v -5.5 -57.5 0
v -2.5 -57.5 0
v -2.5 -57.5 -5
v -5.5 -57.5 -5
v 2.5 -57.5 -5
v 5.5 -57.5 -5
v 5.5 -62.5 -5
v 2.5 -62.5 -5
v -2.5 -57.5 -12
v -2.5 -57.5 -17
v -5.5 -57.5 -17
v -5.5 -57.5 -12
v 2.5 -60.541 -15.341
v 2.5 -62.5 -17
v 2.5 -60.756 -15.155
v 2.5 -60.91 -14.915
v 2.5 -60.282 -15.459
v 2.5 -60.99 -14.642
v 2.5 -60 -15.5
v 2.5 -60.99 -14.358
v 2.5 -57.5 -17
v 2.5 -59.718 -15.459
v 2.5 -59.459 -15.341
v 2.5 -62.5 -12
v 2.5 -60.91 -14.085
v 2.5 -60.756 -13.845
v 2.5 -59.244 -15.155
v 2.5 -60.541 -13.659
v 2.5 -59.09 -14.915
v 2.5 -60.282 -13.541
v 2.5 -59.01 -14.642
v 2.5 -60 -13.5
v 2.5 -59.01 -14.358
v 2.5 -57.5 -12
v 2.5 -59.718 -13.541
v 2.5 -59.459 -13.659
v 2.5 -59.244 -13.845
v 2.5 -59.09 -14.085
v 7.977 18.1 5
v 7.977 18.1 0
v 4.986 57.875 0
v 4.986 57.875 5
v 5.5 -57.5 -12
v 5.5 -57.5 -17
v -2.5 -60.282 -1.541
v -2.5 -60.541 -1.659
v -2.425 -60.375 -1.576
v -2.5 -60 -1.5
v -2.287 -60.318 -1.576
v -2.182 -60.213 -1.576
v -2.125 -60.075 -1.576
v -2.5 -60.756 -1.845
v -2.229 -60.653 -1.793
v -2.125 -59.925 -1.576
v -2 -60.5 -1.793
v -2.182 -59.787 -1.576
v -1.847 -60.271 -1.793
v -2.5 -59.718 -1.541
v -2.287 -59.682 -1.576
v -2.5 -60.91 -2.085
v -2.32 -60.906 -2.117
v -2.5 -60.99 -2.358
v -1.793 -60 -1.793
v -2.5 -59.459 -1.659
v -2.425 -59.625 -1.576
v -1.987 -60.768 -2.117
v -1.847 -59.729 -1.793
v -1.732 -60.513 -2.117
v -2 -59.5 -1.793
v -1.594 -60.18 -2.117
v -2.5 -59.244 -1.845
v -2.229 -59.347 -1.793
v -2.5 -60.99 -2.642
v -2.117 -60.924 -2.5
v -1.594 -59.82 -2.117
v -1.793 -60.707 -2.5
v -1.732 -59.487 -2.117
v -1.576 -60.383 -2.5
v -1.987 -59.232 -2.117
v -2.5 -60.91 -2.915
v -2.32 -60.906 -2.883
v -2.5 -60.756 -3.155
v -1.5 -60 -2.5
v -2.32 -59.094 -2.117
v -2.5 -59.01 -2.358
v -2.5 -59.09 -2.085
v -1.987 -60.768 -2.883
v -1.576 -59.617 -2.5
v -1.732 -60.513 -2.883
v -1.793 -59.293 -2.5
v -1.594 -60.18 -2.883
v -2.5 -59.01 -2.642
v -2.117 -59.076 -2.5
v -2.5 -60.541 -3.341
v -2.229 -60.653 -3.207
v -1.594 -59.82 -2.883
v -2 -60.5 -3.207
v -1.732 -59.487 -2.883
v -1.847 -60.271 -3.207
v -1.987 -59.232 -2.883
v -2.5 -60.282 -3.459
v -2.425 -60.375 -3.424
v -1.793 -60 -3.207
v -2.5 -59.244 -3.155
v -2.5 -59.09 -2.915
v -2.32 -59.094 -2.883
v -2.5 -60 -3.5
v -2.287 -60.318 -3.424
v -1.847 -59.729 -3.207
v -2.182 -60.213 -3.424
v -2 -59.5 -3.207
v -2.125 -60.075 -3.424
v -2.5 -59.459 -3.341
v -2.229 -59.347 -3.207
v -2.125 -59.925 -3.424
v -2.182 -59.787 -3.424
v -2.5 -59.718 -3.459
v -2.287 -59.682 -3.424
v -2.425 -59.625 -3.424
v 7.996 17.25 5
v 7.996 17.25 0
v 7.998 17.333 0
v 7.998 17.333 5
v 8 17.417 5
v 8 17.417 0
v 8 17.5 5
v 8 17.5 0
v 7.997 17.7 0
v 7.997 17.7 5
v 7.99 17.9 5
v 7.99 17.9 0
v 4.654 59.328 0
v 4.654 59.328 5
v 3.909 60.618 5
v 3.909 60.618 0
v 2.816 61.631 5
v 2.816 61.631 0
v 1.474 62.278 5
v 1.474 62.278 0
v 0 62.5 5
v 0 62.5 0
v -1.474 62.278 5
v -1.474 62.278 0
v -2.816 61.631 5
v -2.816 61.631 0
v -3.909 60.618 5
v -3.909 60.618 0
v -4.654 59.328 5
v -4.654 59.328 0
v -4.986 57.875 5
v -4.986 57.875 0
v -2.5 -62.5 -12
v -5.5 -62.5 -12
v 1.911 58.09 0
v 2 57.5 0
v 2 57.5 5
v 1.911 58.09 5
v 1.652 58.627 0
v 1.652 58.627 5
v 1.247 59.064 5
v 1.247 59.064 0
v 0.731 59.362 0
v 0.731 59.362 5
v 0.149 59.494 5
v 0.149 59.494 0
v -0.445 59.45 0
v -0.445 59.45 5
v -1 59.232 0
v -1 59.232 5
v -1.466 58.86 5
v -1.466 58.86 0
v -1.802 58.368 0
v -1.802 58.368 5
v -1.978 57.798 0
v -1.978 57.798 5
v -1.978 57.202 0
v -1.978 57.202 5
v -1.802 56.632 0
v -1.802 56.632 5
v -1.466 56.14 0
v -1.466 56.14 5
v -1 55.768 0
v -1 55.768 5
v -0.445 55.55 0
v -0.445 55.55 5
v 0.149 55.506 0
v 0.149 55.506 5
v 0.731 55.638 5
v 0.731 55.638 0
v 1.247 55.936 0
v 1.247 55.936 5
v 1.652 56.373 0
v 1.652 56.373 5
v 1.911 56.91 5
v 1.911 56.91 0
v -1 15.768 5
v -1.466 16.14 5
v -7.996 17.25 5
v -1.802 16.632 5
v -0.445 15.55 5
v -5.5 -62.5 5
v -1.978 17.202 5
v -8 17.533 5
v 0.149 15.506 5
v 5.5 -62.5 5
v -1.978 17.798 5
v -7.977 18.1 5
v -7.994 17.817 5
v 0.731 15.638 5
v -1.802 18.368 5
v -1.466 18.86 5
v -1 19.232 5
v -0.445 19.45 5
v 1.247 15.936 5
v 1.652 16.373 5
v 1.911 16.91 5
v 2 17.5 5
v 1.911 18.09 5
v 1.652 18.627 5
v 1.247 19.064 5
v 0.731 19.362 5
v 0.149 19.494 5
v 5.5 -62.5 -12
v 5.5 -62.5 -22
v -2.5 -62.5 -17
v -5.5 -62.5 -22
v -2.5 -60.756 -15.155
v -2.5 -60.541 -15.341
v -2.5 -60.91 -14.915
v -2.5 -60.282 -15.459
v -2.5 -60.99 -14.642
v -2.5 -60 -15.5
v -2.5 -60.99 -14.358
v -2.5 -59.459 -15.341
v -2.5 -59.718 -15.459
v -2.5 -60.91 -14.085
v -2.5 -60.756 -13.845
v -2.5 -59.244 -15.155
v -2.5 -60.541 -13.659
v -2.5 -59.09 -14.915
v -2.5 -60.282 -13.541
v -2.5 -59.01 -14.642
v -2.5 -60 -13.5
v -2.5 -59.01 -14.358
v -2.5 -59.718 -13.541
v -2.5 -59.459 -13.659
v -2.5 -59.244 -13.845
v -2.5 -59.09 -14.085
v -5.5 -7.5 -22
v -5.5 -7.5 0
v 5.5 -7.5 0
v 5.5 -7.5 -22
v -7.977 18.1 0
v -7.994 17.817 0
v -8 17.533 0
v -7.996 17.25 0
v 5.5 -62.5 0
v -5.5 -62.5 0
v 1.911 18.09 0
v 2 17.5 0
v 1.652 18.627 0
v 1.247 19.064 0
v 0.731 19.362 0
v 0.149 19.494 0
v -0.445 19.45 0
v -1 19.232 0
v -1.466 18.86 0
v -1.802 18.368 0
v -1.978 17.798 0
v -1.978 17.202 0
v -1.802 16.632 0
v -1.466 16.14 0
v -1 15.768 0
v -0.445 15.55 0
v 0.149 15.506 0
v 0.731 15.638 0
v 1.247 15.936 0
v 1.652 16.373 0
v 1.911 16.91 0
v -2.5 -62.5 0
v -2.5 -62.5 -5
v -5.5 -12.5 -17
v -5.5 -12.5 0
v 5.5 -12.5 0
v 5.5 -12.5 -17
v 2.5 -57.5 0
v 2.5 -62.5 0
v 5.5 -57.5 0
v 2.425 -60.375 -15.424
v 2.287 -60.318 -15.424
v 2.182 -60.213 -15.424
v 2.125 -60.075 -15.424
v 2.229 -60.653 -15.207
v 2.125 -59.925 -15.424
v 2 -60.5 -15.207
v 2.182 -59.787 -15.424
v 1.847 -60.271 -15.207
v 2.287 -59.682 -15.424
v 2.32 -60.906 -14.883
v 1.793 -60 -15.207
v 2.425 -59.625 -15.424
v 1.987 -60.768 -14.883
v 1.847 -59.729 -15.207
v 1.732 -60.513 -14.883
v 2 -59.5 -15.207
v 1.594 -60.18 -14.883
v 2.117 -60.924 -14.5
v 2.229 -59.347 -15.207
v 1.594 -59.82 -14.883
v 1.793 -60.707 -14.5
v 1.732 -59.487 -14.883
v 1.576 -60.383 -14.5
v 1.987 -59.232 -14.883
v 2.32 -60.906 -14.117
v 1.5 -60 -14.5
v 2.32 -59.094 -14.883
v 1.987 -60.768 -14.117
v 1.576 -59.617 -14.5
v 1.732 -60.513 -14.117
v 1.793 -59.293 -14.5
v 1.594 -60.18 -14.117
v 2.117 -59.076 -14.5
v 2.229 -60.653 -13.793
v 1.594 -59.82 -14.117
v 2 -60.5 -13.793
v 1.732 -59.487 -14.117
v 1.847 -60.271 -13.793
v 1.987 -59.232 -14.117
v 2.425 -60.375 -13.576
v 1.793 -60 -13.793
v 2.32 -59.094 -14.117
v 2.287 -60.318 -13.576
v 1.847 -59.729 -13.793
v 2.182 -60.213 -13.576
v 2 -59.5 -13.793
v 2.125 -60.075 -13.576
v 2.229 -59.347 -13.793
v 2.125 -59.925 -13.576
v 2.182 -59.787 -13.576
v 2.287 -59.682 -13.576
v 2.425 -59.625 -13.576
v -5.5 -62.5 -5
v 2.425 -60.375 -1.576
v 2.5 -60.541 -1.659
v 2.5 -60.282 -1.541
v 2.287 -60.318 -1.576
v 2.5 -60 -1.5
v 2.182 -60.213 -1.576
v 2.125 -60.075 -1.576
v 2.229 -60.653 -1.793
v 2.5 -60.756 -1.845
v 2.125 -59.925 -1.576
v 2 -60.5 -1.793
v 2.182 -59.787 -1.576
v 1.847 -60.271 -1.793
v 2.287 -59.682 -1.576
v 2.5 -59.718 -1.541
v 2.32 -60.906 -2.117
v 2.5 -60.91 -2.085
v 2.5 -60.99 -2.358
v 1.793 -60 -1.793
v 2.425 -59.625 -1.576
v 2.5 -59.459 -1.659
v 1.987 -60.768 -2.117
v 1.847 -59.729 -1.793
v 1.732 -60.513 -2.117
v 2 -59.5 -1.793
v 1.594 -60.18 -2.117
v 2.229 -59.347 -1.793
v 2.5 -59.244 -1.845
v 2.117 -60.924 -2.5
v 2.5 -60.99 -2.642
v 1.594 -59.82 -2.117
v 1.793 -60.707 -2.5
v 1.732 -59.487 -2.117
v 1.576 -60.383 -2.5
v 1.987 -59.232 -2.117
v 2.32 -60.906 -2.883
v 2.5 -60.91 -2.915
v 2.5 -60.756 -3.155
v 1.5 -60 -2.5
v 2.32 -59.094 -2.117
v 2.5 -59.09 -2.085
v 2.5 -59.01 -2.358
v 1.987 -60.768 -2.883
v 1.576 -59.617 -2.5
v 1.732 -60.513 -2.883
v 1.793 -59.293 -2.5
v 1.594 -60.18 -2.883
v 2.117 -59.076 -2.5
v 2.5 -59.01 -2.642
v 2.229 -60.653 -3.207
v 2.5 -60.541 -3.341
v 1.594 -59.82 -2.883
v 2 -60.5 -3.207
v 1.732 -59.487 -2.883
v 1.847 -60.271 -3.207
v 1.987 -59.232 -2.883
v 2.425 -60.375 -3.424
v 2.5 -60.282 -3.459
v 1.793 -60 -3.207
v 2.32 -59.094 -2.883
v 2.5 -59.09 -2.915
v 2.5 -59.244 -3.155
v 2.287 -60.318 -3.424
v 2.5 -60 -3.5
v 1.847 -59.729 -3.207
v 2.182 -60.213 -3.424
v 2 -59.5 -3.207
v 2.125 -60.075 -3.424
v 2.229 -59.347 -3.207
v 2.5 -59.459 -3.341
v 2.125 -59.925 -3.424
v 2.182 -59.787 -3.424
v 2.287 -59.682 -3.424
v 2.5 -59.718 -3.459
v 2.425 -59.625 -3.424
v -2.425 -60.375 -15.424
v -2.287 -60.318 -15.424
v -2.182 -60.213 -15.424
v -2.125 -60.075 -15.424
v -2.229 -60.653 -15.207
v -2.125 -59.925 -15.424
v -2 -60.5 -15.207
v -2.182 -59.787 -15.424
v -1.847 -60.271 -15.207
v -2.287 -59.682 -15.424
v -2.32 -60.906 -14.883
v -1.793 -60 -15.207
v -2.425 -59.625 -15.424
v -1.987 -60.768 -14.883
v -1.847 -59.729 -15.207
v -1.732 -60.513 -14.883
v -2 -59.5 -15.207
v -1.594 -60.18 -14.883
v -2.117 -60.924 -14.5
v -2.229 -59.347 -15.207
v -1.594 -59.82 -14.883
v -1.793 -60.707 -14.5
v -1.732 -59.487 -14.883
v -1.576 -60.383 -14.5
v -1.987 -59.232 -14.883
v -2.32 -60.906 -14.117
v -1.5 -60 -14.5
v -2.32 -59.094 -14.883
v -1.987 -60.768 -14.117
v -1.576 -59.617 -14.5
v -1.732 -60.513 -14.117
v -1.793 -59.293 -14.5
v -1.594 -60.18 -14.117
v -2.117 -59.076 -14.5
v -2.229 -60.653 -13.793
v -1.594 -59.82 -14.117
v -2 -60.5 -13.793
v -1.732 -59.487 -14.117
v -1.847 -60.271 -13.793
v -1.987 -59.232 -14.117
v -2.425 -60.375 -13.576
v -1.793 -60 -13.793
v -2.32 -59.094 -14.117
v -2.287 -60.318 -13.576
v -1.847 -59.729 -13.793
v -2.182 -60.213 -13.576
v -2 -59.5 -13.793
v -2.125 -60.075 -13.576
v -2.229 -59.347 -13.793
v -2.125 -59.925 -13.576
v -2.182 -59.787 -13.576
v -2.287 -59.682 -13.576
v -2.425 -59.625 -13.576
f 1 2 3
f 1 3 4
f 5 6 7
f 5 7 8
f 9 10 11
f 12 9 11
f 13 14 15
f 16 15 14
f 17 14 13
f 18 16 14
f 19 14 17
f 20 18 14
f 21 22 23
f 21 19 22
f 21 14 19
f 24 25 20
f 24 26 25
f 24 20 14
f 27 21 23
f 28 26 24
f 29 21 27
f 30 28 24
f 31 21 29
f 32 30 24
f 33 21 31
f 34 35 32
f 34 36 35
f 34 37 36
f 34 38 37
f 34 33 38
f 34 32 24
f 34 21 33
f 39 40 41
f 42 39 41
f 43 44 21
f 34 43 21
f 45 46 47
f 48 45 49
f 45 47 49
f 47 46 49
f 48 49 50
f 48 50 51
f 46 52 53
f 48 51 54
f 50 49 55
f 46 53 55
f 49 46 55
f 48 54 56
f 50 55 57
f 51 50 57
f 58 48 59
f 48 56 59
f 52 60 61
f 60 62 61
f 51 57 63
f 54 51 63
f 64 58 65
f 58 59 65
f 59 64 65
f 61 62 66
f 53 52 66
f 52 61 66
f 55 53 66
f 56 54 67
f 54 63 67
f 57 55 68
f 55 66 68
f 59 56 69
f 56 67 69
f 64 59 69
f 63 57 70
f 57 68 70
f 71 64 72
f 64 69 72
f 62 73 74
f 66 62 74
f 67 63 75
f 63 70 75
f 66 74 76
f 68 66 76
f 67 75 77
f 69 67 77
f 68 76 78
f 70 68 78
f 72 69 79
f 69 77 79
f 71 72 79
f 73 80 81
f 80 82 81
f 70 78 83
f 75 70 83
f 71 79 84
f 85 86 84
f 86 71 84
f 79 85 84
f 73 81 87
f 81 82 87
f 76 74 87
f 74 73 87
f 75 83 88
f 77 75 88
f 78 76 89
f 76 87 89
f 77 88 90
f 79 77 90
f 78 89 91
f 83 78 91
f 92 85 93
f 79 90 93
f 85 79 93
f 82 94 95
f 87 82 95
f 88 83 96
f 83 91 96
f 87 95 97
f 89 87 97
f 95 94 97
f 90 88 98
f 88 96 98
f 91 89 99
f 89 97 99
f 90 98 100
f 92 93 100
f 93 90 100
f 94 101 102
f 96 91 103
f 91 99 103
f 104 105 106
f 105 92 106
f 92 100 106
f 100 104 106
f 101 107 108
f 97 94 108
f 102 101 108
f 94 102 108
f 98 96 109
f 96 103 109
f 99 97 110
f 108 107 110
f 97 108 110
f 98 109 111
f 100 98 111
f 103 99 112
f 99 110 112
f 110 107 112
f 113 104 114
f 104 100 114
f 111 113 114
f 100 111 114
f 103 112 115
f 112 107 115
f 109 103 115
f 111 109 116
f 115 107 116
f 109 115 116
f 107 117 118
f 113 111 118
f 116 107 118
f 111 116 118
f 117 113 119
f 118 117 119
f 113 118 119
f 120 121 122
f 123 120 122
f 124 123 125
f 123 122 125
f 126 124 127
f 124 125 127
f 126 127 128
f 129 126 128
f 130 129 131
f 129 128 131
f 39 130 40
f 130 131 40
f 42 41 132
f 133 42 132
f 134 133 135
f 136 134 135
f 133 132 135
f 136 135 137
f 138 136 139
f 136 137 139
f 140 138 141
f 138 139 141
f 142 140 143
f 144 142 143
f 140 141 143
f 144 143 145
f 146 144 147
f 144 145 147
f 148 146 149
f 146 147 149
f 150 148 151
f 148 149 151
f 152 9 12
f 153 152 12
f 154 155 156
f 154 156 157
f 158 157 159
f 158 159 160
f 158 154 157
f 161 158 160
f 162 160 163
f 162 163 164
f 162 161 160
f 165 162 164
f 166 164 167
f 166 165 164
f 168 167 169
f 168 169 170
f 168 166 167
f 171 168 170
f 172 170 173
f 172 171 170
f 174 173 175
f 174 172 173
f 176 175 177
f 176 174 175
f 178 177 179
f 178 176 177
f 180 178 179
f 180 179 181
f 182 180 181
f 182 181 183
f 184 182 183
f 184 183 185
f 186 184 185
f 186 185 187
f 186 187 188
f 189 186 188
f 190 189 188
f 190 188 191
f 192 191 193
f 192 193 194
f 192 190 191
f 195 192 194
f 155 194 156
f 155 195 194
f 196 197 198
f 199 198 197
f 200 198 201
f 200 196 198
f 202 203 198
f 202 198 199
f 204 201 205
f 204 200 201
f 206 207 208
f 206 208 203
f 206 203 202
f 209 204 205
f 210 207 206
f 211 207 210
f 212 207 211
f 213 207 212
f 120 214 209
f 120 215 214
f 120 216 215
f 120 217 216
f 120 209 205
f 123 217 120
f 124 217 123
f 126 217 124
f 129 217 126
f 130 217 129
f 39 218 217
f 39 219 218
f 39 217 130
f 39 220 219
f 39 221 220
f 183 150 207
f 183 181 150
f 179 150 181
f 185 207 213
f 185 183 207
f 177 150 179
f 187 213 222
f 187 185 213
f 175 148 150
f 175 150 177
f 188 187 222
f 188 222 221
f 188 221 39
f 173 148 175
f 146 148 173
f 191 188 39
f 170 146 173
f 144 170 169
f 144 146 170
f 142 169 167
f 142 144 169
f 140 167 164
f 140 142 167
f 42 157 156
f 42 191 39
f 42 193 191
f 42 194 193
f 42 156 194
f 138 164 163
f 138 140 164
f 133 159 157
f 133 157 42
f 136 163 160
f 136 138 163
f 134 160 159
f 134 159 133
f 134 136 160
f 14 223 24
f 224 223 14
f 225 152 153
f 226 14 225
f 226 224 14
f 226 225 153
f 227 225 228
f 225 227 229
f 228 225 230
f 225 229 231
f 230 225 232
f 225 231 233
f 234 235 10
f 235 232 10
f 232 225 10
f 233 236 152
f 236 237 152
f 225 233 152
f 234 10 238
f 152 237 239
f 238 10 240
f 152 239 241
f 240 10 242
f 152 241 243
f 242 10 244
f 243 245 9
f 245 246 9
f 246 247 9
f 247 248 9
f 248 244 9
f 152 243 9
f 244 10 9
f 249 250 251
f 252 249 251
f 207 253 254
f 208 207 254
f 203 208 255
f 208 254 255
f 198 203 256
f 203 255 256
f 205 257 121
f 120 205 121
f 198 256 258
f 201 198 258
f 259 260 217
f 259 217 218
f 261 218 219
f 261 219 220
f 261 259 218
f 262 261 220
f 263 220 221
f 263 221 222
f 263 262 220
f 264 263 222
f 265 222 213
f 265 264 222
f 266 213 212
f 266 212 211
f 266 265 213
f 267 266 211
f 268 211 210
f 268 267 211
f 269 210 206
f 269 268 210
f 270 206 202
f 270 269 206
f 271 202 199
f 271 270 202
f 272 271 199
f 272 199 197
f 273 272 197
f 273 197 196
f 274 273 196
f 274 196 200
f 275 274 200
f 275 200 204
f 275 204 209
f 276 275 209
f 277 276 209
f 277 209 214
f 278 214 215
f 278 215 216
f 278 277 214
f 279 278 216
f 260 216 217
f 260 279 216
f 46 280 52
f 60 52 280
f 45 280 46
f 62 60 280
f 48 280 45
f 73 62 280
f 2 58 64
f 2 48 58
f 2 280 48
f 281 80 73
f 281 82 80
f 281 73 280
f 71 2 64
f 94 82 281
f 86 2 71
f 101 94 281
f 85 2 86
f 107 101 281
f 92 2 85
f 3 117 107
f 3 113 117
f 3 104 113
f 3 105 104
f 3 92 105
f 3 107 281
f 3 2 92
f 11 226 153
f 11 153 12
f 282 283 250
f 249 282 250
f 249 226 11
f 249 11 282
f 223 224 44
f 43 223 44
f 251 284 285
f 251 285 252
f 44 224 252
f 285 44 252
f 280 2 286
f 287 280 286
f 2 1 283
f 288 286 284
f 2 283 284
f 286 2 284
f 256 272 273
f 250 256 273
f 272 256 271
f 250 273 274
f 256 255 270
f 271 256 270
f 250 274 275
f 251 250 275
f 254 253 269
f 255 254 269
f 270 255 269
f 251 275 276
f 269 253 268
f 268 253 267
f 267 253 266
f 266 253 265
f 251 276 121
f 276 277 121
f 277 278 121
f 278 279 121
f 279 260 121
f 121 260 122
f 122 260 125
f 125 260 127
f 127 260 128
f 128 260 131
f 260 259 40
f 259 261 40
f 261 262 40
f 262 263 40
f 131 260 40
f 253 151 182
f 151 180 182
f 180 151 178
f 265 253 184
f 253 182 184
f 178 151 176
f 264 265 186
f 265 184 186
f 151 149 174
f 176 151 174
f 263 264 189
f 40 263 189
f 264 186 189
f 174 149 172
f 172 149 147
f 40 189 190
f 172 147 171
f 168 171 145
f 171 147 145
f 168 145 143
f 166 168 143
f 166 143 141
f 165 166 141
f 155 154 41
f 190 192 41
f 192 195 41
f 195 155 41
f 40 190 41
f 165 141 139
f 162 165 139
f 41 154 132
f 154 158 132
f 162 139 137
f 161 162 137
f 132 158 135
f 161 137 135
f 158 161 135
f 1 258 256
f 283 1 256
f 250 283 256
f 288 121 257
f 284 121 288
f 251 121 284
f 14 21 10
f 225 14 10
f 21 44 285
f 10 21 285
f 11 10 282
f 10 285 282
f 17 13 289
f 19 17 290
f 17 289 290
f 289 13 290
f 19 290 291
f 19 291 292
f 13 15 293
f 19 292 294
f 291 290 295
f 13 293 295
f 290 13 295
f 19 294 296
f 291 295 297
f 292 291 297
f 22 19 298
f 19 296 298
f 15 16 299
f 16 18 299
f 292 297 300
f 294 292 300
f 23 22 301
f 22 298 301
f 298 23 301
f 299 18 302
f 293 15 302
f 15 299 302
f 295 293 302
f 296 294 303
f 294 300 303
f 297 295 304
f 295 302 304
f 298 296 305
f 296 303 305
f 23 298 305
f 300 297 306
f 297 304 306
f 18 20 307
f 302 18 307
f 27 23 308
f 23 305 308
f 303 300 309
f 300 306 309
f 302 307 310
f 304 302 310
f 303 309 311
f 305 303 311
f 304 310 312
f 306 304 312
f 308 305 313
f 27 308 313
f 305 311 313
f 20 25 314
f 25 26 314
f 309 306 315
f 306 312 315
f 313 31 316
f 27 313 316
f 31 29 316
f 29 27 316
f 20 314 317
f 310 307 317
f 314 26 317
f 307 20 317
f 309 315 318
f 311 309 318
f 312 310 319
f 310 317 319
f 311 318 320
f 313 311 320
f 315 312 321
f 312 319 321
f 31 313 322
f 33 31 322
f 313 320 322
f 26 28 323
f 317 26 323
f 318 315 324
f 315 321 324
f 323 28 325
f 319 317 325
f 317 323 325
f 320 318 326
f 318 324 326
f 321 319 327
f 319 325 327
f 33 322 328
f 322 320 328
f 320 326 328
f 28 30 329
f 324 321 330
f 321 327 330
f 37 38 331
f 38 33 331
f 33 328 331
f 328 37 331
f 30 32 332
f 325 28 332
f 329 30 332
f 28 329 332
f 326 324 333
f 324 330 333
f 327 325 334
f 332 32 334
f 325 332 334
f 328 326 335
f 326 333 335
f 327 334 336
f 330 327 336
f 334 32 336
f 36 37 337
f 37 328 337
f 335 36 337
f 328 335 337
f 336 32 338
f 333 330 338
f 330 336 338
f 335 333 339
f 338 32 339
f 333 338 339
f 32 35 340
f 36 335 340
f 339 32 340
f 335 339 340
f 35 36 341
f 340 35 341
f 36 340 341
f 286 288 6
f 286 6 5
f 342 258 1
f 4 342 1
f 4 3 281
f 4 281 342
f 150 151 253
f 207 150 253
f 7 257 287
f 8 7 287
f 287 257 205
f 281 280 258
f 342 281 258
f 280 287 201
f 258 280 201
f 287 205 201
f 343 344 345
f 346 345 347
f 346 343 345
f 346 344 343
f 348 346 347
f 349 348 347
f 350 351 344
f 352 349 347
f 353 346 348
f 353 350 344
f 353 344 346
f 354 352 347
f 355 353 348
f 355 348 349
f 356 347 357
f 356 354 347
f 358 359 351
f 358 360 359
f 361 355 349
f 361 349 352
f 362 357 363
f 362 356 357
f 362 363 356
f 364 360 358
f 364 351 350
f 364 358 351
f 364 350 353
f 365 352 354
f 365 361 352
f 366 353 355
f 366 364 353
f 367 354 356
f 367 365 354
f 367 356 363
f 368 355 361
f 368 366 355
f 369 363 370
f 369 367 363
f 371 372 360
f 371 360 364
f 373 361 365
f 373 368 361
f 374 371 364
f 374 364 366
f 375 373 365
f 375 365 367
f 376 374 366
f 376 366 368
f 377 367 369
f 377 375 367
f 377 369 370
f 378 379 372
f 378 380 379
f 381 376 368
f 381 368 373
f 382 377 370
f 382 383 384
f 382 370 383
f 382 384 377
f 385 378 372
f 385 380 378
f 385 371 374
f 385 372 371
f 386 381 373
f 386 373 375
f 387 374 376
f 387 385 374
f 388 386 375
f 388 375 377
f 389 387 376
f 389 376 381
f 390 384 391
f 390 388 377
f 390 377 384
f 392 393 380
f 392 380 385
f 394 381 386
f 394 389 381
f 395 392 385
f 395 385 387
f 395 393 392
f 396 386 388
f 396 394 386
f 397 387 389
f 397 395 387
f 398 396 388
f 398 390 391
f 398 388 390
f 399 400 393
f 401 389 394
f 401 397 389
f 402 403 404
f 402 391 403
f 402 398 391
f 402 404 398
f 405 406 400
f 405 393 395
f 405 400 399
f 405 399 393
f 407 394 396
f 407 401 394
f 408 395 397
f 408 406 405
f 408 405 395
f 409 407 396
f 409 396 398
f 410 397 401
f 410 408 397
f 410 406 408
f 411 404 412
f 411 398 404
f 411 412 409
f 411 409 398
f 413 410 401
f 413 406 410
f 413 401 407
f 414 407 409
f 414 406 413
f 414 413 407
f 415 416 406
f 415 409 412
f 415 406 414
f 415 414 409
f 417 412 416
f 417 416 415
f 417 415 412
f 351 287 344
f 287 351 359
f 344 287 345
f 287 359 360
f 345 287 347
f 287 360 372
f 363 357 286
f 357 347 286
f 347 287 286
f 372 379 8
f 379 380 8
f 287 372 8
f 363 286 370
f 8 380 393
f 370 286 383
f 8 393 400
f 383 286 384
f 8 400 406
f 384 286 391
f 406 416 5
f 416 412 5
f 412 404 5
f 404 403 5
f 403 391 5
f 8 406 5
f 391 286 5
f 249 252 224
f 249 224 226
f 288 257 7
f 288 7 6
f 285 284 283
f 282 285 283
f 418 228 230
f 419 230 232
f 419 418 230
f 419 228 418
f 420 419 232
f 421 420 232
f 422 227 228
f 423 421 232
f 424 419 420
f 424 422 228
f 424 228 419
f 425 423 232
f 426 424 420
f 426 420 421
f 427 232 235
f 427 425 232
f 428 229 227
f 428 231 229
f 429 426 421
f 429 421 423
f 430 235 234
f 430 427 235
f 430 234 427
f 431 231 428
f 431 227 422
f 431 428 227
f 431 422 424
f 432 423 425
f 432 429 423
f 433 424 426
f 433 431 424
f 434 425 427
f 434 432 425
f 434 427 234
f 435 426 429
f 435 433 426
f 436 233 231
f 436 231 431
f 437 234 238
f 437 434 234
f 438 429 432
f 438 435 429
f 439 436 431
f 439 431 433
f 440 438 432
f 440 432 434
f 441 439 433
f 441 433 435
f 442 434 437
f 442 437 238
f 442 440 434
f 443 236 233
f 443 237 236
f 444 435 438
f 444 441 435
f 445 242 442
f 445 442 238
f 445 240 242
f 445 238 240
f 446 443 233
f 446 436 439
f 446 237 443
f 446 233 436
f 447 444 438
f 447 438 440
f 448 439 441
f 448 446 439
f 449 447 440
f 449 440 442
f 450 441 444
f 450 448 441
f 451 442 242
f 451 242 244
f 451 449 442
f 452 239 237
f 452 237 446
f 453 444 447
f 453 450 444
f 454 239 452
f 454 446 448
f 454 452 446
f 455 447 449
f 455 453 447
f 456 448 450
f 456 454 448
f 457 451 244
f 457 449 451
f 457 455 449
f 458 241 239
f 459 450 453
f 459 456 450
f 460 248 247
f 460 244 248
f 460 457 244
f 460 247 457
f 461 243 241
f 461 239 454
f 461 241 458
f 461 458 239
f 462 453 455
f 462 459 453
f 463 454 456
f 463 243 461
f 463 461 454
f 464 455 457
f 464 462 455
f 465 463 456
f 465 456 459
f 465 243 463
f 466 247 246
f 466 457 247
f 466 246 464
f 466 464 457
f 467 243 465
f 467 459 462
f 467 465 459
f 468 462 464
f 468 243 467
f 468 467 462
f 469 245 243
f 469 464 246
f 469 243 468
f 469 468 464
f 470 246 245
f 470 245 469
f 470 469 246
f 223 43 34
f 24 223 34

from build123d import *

# Parameters (mm, degrees)
SKETCH1_R           = 2
SKETCH1_R_2         = 5
BOSS_EXTRUDE1_DEPTH = 5
SKETCH2_W           = 11
SKETCH2_H           = 5
BOSS_EXTRUDE2_DEPTH = 5
SKETCH2_3_W         = 5.5
SKETCH2_3_H         = 5
BOSS_EXTRUDE3_DEPTH = 22
SKETCH4_W           = 5
SKETCH4_H           = 5
CUT_EXTRUDE1_DEPTH  = 20
SKETCH6_W           = 11
SKETCH6_H           = 5
BOSS_EXTRUDE4_DEPTH = 50


with BuildPart() as part:
    # Sketch1 → Boss-Extrude1 (new body)
    with BuildSketch(Plane.XY):
        with BuildLine():
            ThreePointArc((7.996084375, 17.249730801), (0, 9.5), (-7.996084375, 17.249730801))
            Line((-7.996084375, 17.249730801), (-5.5, -62.5))
            Line((-5.5, -62.5), (5.5, -62.5))
            Line((5.5, -62.5), (7.996084375, 17.249730801))
        make_face()
        with BuildLine():
            ThreePointArc((7.97746827, 18.1), (0, 25.5), (-7.97746827, 18.1))
            ThreePointArc((-7.97746827, 18.1), (-7.998083236, 17.675112958), (-7.996084375, 17.249730801))
            ThreePointArc((-7.996084375, 17.249730801), (0, 9.5), (7.996084375, 17.249730801))
            ThreePointArc((7.996084375, 17.249730801), (7.999021034, 17.374850086), (8, 17.5))
            ThreePointArc((8, 17.5), (7.994365083, 17.800211458), (7.97746827, 18.1))
        make_face()
        with Locations((0, 17.5)):
            Circle(SKETCH1_R, mode=Mode.SUBTRACT)
        with BuildLine():
            ThreePointArc((5, 57.5), (-0.187632161, 52.503521823), (-4.985917669, 57.875))
            Line((-4.985917669, 57.875), (-7.97746827, 18.1))
            ThreePointArc((-7.97746827, 18.1), (0, 25.5), (7.97746827, 18.1))
            Line((7.97746827, 18.1), (4.985917669, 57.875))
            ThreePointArc((4.985917669, 57.875), (4.996478177, 57.687632161), (5, 57.5))
        make_face()
        with Locations((0, 57.5)):
            Circle(SKETCH1_R_2)
        with Locations((0, 57.5)):
            Circle(SKETCH1_R, mode=Mode.SUBTRACT)
    extrude(amount=BOSS_EXTRUDE1_DEPTH)

    # Sketch2 → Boss-Extrude2 (add)
    with BuildSketch(Plane(origin=(0, 0, 0), x_dir=(-1, 0, 0), z_dir=(0, 0, -1))):
        with Locations((0, -60)):
            Rectangle(SKETCH2_W, SKETCH2_H)
    boss_extrude2 = extrude(amount=BOSS_EXTRUDE2_DEPTH)

    # Sketch2<3> → Boss-Extrude3 (add)
    with BuildSketch(Plane(origin=(0, 0, 0), x_dir=(-1, 0, 0), z_dir=(0, 0, -1))):
        with Locations((-2.75, -10)):
            Rectangle(SKETCH2_3_W, SKETCH2_3_H)
        with Locations((2.75, -10)):
            Rectangle(SKETCH2_3_W, SKETCH2_3_H)
    extrude(amount=BOSS_EXTRUDE3_DEPTH)

    # Sketch4 → Cut-Extrude1 (cut)
    with BuildSketch(Plane(origin=(0, -57.5, 0), x_dir=(1, 0, 0), z_dir=(0, 1, 0))):
        with Locations((0, 2.5)):
            Rectangle(SKETCH4_W, SKETCH4_H)
    cut_extrude1 = extrude(amount=-CUT_EXTRUDE1_DEPTH, mode=Mode.SUBTRACT)

    # Sketch5 → Revolve1 (revolve)
    with BuildSketch(Plane.ZY.offset(-2.5)):
        with BuildLine():
            Line((-3.5, -60), (-1.5, -60))
            ThreePointArc((-1.5, -60), (-2.5, -61), (-3.5, -60))
        make_face()
    revolve1 = revolve(axis=Axis((2.5, -60, 0), (0, 0, -1)))

    # Mirror1: Revolve1 across plane
    add(revolve1.mirror(Plane(origin=(0, 0, 0), x_dir=(0, 0, 1), z_dir=(1, 0, 0))))

    # Sketch6 → Boss-Extrude4 (add)
    with BuildSketch(Plane(origin=(0, -12.5, 0), x_dir=(-1, 0, 0), z_dir=(0, -1, 0))):
        with Locations((0, 19.5)):
            Rectangle(SKETCH6_W, SKETCH6_H)
    extrude(amount=BOSS_EXTRUDE4_DEPTH)

    # Mirror2: Boss-Extrude2, Cut-Extrude1, Revolve1 across plane
    add(boss_extrude2.mirror(Plane(origin=(0, 0, -8.5), x_dir=(1, 0, 0), z_dir=(0, 0, -1))))
    add(cut_extrude1.mirror(Plane(origin=(0, 0, -8.5), x_dir=(1, 0, 0), z_dir=(0, 0, -1))), mode=Mode.SUBTRACT)
    add(revolve1.mirror(Plane(origin=(0, 0, -8.5), x_dir=(1, 0, 0), z_dir=(0, 0, -1))))

    # Mirror2 copy 1 sketch → Mirror2 copy 1 (revolve)
    with BuildSketch(Plane(origin=(-2.5, 0, -17), x_dir=(0, 0, -1), z_dir=(1, 0, 0))):
        with BuildLine():
            Line((-3.5, -60), (-1.5, -60))
            ThreePointArc((-1.5, -60), (-2.5, -61), (-3.5, -60))
        make_face()
    revolve(axis=Axis((-2.5, -60, -17), (0, 0, 1)))


solid = part.part
